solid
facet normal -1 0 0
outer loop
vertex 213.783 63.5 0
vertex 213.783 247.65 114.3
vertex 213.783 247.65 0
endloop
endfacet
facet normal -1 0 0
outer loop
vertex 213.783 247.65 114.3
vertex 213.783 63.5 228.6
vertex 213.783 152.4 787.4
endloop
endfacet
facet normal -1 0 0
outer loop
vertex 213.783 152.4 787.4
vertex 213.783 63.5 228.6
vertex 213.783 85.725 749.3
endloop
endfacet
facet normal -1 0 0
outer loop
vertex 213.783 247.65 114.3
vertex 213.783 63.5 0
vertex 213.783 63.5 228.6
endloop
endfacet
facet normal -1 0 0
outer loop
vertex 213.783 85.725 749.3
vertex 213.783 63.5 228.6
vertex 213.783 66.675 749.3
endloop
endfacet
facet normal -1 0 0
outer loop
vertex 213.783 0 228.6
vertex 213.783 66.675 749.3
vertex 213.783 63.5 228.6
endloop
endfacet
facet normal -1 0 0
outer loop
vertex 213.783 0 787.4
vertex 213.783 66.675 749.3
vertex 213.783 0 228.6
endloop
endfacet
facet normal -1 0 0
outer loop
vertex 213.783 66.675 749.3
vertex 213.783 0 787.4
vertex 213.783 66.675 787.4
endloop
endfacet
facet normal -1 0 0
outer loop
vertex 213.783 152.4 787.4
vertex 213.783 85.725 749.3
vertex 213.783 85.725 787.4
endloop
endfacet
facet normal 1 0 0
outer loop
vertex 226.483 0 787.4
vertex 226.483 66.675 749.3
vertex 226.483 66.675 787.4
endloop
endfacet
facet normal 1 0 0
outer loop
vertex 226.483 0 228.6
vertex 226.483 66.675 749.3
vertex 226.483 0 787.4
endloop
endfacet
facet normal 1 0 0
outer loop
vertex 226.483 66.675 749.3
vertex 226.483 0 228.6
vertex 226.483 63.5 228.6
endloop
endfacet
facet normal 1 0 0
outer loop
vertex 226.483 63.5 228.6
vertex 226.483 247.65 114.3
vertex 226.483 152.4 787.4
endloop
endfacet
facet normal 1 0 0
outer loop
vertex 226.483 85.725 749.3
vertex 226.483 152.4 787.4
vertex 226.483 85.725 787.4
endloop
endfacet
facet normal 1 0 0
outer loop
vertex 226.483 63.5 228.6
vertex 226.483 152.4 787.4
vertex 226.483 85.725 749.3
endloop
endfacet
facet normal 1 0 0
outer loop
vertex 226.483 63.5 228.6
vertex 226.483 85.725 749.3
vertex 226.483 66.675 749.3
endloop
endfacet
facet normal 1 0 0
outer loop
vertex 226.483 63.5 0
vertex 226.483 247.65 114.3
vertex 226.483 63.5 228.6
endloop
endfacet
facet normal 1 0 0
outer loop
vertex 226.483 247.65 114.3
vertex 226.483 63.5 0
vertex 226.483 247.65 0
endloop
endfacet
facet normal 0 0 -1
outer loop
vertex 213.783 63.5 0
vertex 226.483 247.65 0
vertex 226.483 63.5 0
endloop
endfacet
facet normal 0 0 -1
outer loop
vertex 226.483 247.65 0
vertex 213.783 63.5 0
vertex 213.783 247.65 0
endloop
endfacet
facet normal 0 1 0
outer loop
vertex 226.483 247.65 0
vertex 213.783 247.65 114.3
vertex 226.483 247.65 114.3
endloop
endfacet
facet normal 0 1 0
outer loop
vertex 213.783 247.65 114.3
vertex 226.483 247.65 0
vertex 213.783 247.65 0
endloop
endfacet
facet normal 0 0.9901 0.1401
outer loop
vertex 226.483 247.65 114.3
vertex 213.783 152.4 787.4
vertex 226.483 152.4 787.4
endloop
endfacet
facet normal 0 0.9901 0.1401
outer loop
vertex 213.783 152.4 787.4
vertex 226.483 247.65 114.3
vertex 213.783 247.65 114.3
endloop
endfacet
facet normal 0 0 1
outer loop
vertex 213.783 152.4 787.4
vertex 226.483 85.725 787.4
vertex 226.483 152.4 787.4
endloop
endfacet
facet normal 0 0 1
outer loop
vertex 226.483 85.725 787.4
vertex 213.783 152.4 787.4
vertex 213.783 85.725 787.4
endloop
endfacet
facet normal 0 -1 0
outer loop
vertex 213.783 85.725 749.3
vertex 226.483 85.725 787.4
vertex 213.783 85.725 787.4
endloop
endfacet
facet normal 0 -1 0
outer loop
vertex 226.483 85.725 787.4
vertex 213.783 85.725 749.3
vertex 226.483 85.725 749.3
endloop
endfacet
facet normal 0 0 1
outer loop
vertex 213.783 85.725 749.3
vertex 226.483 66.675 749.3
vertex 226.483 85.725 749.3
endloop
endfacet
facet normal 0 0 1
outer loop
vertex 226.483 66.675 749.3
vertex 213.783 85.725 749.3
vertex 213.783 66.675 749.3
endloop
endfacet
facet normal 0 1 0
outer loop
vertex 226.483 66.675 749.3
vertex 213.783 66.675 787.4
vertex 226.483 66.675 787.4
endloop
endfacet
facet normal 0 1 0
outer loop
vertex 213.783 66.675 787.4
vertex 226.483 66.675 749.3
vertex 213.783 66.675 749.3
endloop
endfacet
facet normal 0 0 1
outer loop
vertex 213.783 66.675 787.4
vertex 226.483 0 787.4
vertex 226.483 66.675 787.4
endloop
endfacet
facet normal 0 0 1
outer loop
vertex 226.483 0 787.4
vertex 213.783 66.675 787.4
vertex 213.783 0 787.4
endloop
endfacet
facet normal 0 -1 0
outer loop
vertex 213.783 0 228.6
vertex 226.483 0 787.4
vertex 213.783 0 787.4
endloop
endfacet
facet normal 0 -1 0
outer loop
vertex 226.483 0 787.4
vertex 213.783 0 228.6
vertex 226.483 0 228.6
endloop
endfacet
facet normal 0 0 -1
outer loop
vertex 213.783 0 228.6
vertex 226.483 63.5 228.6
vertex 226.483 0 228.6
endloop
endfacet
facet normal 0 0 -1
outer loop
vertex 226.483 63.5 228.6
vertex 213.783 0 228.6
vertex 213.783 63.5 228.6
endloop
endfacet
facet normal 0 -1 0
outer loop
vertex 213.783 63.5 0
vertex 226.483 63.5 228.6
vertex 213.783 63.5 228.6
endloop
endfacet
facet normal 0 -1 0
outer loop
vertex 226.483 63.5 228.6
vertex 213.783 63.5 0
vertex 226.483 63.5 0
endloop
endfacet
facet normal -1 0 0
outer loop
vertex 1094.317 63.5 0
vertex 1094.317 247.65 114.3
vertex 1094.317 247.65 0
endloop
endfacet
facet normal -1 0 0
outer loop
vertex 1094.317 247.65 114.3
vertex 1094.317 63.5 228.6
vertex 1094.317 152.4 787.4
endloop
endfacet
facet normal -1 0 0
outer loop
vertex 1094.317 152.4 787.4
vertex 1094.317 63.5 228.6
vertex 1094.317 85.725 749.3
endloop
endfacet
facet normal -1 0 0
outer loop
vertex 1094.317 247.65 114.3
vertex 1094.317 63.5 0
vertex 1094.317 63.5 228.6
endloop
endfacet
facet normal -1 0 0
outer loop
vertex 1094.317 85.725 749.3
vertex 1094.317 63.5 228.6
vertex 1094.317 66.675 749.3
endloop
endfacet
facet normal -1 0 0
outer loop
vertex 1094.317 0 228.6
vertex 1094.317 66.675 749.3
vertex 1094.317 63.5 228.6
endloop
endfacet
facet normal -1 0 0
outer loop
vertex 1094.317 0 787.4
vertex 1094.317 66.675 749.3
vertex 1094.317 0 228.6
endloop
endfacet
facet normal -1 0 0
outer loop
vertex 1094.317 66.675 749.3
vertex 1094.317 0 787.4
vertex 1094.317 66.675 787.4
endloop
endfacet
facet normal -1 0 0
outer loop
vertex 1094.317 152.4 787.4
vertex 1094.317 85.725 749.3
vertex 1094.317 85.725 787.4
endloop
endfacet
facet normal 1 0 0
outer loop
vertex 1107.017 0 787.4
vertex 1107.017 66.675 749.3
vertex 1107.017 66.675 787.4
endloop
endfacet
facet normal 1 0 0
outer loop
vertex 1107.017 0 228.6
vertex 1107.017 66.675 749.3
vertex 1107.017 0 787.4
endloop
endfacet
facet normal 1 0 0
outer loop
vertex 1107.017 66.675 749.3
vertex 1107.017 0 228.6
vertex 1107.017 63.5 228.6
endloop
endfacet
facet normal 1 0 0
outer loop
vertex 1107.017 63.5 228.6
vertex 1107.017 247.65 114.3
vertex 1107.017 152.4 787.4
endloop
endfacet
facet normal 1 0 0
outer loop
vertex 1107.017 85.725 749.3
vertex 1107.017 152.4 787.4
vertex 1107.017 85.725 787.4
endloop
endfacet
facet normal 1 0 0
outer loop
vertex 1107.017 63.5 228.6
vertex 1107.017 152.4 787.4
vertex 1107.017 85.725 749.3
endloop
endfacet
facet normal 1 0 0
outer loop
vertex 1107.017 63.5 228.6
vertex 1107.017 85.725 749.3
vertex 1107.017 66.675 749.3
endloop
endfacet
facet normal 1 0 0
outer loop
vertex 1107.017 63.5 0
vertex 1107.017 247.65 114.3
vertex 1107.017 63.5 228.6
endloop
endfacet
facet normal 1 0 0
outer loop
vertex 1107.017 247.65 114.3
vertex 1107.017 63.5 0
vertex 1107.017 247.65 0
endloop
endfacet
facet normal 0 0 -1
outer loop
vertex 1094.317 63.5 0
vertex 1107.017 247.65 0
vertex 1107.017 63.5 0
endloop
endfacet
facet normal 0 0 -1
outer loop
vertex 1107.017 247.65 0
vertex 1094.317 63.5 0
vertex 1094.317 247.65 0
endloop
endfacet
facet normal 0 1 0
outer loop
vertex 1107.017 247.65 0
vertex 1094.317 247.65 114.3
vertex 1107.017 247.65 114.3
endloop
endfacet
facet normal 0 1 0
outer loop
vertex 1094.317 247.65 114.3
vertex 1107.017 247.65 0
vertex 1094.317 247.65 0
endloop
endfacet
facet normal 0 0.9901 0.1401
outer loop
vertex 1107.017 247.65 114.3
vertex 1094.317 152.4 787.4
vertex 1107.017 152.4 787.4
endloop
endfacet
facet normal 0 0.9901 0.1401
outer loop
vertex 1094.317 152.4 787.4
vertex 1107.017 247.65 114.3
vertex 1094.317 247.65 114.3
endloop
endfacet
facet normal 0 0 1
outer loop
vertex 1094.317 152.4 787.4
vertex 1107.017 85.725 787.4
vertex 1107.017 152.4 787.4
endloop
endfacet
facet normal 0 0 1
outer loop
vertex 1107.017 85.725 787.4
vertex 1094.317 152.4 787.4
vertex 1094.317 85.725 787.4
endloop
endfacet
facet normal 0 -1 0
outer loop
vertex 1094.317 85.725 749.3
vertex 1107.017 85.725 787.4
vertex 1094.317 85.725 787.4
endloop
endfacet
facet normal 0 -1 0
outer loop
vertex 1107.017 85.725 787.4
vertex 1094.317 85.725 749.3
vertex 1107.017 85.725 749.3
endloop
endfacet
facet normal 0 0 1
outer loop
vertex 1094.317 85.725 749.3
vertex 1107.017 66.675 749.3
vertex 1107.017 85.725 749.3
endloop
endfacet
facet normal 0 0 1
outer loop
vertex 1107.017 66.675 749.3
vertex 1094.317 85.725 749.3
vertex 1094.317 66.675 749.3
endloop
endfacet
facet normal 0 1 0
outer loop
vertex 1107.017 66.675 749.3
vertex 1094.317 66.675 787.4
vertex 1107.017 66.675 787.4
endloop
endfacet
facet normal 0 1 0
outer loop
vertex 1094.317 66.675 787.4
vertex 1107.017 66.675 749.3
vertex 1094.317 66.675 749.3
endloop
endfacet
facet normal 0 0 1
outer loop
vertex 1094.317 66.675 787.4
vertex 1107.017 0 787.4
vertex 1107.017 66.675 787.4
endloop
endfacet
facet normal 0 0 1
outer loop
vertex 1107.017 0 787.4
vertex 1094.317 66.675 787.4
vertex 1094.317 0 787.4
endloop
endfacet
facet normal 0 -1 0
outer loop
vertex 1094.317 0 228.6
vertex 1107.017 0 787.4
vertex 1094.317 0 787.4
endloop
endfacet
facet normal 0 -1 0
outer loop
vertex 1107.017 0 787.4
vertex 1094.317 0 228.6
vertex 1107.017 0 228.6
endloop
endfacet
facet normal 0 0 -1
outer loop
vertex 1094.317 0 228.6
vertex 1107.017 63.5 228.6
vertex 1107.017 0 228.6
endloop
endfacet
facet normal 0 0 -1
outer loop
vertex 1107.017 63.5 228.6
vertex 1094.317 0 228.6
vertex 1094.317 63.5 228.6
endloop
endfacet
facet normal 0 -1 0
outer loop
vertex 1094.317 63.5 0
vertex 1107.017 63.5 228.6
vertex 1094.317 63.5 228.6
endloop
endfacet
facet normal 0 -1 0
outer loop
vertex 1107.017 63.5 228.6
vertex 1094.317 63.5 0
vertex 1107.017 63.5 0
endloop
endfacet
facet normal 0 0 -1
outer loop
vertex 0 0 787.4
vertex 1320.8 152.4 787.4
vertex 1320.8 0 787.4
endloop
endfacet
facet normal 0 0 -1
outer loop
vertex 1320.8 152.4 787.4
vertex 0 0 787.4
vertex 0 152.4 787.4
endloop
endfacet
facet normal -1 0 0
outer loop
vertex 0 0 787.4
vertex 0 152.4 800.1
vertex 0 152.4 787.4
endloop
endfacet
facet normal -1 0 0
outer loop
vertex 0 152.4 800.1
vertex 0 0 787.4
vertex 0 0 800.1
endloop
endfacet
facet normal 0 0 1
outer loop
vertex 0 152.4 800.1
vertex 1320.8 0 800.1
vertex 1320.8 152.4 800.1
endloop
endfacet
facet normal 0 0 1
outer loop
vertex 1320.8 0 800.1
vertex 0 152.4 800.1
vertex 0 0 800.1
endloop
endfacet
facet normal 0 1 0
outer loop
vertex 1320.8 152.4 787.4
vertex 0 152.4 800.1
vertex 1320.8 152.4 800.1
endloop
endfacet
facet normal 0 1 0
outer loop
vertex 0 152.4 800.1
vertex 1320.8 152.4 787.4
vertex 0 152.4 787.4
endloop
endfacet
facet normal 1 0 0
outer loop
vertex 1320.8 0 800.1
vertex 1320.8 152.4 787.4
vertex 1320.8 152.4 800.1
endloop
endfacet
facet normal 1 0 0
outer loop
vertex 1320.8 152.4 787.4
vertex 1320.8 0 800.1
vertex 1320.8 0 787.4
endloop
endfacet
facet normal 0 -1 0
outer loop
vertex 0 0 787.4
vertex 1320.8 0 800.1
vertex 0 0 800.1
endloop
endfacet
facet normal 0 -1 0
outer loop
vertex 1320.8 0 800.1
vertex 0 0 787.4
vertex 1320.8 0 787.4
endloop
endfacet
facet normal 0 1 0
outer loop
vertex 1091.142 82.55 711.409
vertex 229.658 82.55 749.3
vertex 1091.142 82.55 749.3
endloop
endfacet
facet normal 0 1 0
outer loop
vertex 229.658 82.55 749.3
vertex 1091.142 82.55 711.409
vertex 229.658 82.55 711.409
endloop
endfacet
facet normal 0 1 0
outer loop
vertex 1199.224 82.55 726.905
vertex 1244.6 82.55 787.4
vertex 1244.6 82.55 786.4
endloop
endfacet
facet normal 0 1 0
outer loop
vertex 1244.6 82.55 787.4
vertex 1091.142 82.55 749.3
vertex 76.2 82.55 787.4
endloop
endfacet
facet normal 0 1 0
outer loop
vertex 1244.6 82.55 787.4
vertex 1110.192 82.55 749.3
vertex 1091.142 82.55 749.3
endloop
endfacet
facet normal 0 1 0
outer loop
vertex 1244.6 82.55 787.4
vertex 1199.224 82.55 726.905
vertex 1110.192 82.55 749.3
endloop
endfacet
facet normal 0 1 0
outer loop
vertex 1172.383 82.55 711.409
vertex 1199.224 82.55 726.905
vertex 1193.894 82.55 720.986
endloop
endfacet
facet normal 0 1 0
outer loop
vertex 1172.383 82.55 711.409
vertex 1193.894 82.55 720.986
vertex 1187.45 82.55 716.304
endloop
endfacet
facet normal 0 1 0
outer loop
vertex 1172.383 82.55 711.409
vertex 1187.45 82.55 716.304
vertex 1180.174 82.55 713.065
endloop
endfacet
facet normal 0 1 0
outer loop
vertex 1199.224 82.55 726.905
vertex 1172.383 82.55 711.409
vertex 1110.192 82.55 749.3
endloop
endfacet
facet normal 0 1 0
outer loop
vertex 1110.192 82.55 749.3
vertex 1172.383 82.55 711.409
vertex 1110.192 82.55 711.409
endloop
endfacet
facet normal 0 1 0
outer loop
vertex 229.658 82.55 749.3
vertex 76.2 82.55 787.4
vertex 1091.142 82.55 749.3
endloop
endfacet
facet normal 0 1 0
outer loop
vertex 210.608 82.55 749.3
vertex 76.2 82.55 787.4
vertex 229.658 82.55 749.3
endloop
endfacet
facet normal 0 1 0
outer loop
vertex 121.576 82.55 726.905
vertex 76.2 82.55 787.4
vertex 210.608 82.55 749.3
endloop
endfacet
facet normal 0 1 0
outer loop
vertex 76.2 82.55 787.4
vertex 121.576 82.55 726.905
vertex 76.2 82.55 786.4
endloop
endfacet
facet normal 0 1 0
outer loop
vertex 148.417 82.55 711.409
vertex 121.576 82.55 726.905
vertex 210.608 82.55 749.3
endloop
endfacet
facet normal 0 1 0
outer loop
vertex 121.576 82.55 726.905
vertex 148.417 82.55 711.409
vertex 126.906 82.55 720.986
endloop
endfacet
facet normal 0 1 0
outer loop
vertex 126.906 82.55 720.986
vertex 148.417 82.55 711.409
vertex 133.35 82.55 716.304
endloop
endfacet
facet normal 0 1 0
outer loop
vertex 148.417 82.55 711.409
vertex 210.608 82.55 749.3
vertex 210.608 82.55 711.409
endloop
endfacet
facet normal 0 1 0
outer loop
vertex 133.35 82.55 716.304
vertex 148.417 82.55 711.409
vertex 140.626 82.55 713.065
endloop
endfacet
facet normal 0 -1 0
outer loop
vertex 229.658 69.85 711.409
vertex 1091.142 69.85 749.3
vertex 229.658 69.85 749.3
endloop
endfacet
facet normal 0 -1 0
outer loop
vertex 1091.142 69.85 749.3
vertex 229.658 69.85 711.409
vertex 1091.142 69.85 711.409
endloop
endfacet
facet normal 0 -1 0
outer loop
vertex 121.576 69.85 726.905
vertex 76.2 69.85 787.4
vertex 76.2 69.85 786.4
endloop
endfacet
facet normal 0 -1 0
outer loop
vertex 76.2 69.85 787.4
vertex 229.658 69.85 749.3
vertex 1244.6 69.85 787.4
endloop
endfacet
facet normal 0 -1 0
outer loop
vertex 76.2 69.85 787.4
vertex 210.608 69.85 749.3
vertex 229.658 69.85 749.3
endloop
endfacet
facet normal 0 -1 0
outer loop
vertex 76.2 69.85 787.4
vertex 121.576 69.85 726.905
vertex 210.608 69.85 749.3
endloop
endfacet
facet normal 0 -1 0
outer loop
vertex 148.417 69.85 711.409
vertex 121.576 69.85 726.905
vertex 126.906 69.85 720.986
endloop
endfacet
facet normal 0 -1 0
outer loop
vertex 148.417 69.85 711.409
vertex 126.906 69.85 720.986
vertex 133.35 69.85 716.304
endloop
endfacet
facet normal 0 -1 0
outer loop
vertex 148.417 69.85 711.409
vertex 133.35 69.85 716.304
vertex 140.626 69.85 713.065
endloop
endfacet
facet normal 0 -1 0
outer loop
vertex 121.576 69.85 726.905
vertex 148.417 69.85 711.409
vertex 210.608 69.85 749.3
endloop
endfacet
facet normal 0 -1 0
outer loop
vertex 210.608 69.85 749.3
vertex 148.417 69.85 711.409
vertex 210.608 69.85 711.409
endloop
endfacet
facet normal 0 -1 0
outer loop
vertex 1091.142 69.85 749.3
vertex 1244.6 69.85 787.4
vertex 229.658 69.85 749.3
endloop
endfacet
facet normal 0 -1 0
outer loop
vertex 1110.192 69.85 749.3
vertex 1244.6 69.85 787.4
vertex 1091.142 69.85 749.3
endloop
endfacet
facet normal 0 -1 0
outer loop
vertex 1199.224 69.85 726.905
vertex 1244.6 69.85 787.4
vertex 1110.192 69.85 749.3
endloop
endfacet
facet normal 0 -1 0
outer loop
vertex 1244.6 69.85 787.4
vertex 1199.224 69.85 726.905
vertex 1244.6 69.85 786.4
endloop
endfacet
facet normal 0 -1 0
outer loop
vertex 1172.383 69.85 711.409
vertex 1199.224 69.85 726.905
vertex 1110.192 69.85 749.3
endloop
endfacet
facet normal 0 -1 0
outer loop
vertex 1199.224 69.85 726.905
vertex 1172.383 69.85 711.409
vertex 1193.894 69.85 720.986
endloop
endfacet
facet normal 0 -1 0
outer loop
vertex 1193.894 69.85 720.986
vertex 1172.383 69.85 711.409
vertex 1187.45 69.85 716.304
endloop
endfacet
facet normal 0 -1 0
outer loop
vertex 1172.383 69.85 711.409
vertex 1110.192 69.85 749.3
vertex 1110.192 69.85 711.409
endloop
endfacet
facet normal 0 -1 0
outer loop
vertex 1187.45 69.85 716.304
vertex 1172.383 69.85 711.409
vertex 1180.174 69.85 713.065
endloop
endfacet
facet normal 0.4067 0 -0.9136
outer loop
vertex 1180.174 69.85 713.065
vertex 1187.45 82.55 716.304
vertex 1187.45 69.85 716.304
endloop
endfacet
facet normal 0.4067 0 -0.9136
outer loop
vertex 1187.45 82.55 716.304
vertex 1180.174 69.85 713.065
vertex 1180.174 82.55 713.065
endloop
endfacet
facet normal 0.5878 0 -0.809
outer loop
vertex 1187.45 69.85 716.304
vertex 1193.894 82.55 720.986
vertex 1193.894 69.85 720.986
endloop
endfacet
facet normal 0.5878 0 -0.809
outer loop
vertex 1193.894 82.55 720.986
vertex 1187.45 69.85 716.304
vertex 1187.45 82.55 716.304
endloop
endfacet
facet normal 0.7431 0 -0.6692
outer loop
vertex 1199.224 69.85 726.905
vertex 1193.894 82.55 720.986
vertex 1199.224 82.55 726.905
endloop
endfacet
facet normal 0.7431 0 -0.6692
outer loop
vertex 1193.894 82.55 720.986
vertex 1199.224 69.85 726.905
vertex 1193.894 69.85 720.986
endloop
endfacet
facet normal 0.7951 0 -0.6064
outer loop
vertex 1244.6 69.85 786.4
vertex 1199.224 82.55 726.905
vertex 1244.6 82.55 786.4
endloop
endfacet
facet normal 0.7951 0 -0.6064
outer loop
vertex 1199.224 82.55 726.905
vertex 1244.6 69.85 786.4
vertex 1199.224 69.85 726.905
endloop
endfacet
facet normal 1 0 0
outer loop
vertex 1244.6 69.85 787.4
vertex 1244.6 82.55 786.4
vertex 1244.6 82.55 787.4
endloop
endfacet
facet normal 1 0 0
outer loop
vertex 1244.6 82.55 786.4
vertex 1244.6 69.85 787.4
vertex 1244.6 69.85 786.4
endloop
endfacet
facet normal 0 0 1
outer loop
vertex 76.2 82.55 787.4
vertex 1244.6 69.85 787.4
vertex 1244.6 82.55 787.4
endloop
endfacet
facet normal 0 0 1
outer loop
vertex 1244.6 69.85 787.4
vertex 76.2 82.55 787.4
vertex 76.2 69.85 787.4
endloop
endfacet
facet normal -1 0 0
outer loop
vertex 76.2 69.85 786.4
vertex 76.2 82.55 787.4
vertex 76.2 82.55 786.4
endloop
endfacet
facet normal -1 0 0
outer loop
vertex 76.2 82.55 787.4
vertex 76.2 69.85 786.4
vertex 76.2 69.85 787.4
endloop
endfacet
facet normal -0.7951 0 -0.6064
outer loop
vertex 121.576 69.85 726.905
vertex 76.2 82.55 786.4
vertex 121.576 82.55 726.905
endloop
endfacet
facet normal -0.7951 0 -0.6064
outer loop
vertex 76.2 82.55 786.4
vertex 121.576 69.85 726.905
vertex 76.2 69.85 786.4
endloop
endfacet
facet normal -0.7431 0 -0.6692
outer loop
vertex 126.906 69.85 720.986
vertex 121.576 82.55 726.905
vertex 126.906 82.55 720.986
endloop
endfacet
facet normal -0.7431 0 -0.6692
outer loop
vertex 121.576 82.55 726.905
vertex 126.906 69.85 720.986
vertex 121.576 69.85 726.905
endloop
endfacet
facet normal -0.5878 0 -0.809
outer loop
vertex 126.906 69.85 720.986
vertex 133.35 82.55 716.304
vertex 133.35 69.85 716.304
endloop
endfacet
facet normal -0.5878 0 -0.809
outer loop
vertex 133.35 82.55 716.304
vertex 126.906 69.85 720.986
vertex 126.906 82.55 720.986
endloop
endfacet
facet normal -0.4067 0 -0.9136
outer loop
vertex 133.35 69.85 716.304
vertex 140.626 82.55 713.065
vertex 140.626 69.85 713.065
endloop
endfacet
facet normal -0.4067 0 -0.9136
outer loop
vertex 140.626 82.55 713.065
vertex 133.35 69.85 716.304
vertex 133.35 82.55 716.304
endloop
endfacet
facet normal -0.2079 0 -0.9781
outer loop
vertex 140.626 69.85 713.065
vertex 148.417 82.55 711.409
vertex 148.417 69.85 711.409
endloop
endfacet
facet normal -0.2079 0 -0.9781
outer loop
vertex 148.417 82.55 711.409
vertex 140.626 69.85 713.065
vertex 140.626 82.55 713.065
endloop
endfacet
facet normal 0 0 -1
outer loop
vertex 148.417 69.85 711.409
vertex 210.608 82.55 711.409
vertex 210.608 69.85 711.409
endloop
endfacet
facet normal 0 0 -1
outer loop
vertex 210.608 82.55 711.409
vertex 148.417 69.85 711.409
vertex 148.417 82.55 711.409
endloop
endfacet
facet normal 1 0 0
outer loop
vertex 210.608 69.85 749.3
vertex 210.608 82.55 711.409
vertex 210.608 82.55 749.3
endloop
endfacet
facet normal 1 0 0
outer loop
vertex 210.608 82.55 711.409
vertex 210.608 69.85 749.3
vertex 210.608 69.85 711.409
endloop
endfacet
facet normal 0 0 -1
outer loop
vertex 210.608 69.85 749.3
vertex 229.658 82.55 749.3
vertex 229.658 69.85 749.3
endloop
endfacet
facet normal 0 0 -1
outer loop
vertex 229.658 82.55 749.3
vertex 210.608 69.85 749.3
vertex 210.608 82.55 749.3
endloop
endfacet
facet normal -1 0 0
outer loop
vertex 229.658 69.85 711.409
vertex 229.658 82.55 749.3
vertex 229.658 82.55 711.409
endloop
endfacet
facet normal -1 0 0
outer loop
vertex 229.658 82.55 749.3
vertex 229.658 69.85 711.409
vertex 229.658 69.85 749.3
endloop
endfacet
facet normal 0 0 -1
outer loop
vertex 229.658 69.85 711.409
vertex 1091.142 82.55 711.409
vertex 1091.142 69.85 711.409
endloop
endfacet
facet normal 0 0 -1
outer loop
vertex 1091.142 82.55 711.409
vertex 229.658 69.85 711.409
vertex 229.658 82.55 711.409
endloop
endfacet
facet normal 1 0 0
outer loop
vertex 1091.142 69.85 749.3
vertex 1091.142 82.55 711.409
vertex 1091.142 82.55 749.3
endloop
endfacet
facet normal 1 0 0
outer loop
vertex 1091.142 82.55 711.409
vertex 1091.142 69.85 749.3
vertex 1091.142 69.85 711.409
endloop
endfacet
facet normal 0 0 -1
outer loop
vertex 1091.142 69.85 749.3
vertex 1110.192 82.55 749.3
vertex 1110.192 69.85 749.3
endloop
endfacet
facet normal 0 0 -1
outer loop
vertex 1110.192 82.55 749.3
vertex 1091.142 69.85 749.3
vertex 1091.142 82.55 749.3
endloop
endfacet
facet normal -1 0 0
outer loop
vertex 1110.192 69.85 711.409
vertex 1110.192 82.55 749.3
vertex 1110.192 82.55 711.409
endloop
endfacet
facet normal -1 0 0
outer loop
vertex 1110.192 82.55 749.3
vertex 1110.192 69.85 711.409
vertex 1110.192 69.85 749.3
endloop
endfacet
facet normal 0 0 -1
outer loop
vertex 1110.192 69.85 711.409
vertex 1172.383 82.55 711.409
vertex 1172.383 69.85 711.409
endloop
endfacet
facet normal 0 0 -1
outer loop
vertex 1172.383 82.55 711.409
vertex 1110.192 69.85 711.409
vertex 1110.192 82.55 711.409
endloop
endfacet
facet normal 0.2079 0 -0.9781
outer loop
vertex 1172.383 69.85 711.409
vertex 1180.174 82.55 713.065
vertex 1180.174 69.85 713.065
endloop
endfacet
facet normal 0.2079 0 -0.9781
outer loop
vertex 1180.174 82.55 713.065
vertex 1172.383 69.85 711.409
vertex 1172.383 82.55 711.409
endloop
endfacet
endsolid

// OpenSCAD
in=25.4;
top_x=52*in;
top_y=6*in;
top_z=31.5*in;

spine_h=3*in;
spine_from_end=spine_h;

spine_inset=spine_h;
spine_inset_r=spine_h/2;

wood=in/2;

furnace_x=2.5*in;
furnace_y=9*in;

couch_x=3.75*in;
couch_y=4.5*in;

legs=2;

spacing=top_x/(legs-0.5);

gap=in/8;

module wood() {
    linear_extrude(height=wood)
    children();
}


module top() {
    square([top_x,top_y]);
}

module assembled() {
    translate([0,0,top_z-wood])
    color("blue")
    wood()
    top();

    translate([0,wood/2+top_y/2,top_z-spine_h-wood])
    rotate([90,0,0])
    color("lime")
    wood()
    spine();


    for(x=[spacing/4:spacing:top_x])
    translate([-wood/2+x,0,0])
    rotate([90,0,90])
    color("red")
    wood()
    leg();
}

module dirror_x(x=0){
    children();
    translate([x,0,0])
    mirror([1,0,0])
    children();
}

module spine() {
    
    difference() {
        hull() {
            translate([spine_from_end,spine_h-1])
            square([top_x-spine_from_end*2,1]);
            dirror_x(top_x)
            translate([spine_from_end+spine_inset,spine_inset_r])
            circle(r=spine_inset_r);
        }
        for(x=[spacing/4:spacing:top_x])
        translate([x-wood/2-gap,0])
        square([wood+gap*2,spine_h/2]);
    }
}

module leg() {
    difference() {
        hull() {
            square([top_y,top_z-wood]);
            translate([top_y,0])
            square([couch_x,couch_y]);
        }
        square([furnace_x,furnace_y]);
        translate([top_y/2-wood/2-gap,top_z-wood-spine_h/2])
        square([wood+gap*2,spine_h/2]);
    }
}

assembled();
